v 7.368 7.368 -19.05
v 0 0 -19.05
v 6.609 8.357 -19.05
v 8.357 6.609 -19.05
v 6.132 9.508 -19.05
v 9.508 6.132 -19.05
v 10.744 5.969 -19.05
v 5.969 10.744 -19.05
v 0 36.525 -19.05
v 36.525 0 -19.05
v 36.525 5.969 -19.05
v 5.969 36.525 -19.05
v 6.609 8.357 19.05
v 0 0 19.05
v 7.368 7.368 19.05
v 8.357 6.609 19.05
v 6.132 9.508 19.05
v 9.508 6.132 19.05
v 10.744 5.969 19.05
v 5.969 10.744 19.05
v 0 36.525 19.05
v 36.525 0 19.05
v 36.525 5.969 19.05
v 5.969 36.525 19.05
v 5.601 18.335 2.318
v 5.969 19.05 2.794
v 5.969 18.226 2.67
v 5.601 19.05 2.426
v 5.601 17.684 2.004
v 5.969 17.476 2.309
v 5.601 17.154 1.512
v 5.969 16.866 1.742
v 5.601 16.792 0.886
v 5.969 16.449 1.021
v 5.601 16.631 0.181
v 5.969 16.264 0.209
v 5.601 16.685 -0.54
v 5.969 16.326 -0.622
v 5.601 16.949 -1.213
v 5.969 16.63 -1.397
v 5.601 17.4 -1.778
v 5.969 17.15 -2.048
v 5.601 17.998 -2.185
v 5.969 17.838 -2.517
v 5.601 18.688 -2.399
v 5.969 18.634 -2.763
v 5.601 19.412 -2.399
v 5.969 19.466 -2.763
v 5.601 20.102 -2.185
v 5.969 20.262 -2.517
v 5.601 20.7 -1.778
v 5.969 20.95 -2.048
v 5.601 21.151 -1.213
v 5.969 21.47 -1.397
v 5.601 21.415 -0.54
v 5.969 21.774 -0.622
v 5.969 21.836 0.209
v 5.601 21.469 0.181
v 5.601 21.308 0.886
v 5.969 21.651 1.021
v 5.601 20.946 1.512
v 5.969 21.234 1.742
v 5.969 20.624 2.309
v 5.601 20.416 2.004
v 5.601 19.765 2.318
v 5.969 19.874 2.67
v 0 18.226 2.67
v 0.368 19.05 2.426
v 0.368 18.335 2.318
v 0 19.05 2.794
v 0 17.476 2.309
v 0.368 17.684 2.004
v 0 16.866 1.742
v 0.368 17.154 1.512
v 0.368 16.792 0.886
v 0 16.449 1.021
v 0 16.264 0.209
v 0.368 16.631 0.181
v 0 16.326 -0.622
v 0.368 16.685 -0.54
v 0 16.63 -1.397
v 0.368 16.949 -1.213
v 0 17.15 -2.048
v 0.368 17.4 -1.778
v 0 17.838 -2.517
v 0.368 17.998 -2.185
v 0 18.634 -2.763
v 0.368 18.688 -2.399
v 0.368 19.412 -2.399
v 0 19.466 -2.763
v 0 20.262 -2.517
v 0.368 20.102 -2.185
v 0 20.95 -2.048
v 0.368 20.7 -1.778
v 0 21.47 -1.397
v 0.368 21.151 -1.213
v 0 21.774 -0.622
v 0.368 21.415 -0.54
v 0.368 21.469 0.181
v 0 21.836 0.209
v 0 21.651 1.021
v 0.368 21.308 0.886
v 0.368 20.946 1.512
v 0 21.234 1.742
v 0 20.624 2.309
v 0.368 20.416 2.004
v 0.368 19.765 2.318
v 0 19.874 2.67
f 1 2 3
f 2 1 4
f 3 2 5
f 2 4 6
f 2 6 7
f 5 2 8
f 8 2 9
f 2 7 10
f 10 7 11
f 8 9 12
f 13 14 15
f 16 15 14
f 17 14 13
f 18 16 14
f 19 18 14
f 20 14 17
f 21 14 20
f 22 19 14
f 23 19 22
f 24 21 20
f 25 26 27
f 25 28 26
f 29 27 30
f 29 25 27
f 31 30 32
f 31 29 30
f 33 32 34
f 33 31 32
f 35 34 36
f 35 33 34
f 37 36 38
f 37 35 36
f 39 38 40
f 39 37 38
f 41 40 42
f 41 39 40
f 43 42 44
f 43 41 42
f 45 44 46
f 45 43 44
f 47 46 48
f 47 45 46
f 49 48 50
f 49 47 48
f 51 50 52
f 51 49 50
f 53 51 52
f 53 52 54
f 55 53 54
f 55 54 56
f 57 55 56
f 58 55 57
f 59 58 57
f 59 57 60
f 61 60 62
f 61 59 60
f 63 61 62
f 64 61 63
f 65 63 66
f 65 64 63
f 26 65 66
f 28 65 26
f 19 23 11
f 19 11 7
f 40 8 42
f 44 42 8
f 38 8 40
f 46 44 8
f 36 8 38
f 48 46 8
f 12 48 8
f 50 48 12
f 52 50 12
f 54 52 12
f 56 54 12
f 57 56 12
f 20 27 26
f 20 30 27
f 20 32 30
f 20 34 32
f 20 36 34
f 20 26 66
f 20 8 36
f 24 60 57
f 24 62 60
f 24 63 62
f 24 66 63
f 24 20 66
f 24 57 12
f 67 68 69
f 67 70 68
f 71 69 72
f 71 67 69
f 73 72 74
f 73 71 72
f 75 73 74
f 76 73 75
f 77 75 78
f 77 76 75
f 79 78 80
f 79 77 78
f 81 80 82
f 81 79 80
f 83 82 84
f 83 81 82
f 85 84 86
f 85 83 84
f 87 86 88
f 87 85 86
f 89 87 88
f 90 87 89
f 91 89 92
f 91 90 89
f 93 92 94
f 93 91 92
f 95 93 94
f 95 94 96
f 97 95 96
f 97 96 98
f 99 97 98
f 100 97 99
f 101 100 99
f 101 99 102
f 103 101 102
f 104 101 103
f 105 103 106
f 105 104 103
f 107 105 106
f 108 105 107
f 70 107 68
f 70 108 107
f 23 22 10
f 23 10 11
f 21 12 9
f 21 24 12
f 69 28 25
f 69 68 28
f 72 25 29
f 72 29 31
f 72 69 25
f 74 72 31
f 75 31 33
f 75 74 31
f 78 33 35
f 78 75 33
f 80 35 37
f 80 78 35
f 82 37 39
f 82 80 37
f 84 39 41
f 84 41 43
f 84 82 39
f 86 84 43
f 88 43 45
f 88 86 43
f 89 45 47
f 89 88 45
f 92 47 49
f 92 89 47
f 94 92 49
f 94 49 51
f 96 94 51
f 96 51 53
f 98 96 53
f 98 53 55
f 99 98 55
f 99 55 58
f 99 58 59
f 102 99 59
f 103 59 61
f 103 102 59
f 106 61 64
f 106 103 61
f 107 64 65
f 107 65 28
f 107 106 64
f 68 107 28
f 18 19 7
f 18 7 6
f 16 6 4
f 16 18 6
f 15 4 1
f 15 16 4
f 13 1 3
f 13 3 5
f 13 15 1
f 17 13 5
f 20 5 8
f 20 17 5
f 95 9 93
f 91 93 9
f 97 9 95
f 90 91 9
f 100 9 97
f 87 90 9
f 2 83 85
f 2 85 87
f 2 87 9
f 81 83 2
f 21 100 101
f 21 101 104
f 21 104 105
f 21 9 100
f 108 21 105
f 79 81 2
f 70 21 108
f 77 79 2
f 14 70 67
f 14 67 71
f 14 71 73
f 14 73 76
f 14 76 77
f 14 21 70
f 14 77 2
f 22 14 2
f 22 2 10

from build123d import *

# Parameters (mm, degrees)
BOSS_EXTRUDE1_DEPTH = 19.05


with BuildPart() as part:
    # Sketch1 → Boss-Extrude1 (new, symmetric)
    with BuildSketch(Plane.XY):
        with BuildLine():
            Line((0, 36.5252), (0, 0))
            Line((0, 0), (36.5252, 0))
            Line((36.5252, 0), (36.5252, 5.969))
            Line((36.5252, 5.969), (10.7442, 5.969))
            ThreePointArc((10.7442, 5.969), (7.367623698, 7.367623698), (5.969, 10.7442))
            Line((5.969, 10.7442), (5.969, 36.5252))
            Line((5.969, 36.5252), (0, 36.5252))
        make_face()
    extrude(amount=BOSS_EXTRUDE1_DEPTH, both=True)

    # Sketch9 → #11 (0.191) Diameter Hole1 (revolve, cut)
    with BuildSketch(Plane.ZX.offset(19.05)):
        Polygon((0, 0), (0, 5.969), (2.794, 5.969), (2.4257, 5.6007), (2.4257, 0.3683), (2.794, 0), align=None)
    revolve(axis=Axis((-6.35, 19.05, 0), (1, 0, 0)), mode=Mode.SUBTRACT)


solid = part.part
